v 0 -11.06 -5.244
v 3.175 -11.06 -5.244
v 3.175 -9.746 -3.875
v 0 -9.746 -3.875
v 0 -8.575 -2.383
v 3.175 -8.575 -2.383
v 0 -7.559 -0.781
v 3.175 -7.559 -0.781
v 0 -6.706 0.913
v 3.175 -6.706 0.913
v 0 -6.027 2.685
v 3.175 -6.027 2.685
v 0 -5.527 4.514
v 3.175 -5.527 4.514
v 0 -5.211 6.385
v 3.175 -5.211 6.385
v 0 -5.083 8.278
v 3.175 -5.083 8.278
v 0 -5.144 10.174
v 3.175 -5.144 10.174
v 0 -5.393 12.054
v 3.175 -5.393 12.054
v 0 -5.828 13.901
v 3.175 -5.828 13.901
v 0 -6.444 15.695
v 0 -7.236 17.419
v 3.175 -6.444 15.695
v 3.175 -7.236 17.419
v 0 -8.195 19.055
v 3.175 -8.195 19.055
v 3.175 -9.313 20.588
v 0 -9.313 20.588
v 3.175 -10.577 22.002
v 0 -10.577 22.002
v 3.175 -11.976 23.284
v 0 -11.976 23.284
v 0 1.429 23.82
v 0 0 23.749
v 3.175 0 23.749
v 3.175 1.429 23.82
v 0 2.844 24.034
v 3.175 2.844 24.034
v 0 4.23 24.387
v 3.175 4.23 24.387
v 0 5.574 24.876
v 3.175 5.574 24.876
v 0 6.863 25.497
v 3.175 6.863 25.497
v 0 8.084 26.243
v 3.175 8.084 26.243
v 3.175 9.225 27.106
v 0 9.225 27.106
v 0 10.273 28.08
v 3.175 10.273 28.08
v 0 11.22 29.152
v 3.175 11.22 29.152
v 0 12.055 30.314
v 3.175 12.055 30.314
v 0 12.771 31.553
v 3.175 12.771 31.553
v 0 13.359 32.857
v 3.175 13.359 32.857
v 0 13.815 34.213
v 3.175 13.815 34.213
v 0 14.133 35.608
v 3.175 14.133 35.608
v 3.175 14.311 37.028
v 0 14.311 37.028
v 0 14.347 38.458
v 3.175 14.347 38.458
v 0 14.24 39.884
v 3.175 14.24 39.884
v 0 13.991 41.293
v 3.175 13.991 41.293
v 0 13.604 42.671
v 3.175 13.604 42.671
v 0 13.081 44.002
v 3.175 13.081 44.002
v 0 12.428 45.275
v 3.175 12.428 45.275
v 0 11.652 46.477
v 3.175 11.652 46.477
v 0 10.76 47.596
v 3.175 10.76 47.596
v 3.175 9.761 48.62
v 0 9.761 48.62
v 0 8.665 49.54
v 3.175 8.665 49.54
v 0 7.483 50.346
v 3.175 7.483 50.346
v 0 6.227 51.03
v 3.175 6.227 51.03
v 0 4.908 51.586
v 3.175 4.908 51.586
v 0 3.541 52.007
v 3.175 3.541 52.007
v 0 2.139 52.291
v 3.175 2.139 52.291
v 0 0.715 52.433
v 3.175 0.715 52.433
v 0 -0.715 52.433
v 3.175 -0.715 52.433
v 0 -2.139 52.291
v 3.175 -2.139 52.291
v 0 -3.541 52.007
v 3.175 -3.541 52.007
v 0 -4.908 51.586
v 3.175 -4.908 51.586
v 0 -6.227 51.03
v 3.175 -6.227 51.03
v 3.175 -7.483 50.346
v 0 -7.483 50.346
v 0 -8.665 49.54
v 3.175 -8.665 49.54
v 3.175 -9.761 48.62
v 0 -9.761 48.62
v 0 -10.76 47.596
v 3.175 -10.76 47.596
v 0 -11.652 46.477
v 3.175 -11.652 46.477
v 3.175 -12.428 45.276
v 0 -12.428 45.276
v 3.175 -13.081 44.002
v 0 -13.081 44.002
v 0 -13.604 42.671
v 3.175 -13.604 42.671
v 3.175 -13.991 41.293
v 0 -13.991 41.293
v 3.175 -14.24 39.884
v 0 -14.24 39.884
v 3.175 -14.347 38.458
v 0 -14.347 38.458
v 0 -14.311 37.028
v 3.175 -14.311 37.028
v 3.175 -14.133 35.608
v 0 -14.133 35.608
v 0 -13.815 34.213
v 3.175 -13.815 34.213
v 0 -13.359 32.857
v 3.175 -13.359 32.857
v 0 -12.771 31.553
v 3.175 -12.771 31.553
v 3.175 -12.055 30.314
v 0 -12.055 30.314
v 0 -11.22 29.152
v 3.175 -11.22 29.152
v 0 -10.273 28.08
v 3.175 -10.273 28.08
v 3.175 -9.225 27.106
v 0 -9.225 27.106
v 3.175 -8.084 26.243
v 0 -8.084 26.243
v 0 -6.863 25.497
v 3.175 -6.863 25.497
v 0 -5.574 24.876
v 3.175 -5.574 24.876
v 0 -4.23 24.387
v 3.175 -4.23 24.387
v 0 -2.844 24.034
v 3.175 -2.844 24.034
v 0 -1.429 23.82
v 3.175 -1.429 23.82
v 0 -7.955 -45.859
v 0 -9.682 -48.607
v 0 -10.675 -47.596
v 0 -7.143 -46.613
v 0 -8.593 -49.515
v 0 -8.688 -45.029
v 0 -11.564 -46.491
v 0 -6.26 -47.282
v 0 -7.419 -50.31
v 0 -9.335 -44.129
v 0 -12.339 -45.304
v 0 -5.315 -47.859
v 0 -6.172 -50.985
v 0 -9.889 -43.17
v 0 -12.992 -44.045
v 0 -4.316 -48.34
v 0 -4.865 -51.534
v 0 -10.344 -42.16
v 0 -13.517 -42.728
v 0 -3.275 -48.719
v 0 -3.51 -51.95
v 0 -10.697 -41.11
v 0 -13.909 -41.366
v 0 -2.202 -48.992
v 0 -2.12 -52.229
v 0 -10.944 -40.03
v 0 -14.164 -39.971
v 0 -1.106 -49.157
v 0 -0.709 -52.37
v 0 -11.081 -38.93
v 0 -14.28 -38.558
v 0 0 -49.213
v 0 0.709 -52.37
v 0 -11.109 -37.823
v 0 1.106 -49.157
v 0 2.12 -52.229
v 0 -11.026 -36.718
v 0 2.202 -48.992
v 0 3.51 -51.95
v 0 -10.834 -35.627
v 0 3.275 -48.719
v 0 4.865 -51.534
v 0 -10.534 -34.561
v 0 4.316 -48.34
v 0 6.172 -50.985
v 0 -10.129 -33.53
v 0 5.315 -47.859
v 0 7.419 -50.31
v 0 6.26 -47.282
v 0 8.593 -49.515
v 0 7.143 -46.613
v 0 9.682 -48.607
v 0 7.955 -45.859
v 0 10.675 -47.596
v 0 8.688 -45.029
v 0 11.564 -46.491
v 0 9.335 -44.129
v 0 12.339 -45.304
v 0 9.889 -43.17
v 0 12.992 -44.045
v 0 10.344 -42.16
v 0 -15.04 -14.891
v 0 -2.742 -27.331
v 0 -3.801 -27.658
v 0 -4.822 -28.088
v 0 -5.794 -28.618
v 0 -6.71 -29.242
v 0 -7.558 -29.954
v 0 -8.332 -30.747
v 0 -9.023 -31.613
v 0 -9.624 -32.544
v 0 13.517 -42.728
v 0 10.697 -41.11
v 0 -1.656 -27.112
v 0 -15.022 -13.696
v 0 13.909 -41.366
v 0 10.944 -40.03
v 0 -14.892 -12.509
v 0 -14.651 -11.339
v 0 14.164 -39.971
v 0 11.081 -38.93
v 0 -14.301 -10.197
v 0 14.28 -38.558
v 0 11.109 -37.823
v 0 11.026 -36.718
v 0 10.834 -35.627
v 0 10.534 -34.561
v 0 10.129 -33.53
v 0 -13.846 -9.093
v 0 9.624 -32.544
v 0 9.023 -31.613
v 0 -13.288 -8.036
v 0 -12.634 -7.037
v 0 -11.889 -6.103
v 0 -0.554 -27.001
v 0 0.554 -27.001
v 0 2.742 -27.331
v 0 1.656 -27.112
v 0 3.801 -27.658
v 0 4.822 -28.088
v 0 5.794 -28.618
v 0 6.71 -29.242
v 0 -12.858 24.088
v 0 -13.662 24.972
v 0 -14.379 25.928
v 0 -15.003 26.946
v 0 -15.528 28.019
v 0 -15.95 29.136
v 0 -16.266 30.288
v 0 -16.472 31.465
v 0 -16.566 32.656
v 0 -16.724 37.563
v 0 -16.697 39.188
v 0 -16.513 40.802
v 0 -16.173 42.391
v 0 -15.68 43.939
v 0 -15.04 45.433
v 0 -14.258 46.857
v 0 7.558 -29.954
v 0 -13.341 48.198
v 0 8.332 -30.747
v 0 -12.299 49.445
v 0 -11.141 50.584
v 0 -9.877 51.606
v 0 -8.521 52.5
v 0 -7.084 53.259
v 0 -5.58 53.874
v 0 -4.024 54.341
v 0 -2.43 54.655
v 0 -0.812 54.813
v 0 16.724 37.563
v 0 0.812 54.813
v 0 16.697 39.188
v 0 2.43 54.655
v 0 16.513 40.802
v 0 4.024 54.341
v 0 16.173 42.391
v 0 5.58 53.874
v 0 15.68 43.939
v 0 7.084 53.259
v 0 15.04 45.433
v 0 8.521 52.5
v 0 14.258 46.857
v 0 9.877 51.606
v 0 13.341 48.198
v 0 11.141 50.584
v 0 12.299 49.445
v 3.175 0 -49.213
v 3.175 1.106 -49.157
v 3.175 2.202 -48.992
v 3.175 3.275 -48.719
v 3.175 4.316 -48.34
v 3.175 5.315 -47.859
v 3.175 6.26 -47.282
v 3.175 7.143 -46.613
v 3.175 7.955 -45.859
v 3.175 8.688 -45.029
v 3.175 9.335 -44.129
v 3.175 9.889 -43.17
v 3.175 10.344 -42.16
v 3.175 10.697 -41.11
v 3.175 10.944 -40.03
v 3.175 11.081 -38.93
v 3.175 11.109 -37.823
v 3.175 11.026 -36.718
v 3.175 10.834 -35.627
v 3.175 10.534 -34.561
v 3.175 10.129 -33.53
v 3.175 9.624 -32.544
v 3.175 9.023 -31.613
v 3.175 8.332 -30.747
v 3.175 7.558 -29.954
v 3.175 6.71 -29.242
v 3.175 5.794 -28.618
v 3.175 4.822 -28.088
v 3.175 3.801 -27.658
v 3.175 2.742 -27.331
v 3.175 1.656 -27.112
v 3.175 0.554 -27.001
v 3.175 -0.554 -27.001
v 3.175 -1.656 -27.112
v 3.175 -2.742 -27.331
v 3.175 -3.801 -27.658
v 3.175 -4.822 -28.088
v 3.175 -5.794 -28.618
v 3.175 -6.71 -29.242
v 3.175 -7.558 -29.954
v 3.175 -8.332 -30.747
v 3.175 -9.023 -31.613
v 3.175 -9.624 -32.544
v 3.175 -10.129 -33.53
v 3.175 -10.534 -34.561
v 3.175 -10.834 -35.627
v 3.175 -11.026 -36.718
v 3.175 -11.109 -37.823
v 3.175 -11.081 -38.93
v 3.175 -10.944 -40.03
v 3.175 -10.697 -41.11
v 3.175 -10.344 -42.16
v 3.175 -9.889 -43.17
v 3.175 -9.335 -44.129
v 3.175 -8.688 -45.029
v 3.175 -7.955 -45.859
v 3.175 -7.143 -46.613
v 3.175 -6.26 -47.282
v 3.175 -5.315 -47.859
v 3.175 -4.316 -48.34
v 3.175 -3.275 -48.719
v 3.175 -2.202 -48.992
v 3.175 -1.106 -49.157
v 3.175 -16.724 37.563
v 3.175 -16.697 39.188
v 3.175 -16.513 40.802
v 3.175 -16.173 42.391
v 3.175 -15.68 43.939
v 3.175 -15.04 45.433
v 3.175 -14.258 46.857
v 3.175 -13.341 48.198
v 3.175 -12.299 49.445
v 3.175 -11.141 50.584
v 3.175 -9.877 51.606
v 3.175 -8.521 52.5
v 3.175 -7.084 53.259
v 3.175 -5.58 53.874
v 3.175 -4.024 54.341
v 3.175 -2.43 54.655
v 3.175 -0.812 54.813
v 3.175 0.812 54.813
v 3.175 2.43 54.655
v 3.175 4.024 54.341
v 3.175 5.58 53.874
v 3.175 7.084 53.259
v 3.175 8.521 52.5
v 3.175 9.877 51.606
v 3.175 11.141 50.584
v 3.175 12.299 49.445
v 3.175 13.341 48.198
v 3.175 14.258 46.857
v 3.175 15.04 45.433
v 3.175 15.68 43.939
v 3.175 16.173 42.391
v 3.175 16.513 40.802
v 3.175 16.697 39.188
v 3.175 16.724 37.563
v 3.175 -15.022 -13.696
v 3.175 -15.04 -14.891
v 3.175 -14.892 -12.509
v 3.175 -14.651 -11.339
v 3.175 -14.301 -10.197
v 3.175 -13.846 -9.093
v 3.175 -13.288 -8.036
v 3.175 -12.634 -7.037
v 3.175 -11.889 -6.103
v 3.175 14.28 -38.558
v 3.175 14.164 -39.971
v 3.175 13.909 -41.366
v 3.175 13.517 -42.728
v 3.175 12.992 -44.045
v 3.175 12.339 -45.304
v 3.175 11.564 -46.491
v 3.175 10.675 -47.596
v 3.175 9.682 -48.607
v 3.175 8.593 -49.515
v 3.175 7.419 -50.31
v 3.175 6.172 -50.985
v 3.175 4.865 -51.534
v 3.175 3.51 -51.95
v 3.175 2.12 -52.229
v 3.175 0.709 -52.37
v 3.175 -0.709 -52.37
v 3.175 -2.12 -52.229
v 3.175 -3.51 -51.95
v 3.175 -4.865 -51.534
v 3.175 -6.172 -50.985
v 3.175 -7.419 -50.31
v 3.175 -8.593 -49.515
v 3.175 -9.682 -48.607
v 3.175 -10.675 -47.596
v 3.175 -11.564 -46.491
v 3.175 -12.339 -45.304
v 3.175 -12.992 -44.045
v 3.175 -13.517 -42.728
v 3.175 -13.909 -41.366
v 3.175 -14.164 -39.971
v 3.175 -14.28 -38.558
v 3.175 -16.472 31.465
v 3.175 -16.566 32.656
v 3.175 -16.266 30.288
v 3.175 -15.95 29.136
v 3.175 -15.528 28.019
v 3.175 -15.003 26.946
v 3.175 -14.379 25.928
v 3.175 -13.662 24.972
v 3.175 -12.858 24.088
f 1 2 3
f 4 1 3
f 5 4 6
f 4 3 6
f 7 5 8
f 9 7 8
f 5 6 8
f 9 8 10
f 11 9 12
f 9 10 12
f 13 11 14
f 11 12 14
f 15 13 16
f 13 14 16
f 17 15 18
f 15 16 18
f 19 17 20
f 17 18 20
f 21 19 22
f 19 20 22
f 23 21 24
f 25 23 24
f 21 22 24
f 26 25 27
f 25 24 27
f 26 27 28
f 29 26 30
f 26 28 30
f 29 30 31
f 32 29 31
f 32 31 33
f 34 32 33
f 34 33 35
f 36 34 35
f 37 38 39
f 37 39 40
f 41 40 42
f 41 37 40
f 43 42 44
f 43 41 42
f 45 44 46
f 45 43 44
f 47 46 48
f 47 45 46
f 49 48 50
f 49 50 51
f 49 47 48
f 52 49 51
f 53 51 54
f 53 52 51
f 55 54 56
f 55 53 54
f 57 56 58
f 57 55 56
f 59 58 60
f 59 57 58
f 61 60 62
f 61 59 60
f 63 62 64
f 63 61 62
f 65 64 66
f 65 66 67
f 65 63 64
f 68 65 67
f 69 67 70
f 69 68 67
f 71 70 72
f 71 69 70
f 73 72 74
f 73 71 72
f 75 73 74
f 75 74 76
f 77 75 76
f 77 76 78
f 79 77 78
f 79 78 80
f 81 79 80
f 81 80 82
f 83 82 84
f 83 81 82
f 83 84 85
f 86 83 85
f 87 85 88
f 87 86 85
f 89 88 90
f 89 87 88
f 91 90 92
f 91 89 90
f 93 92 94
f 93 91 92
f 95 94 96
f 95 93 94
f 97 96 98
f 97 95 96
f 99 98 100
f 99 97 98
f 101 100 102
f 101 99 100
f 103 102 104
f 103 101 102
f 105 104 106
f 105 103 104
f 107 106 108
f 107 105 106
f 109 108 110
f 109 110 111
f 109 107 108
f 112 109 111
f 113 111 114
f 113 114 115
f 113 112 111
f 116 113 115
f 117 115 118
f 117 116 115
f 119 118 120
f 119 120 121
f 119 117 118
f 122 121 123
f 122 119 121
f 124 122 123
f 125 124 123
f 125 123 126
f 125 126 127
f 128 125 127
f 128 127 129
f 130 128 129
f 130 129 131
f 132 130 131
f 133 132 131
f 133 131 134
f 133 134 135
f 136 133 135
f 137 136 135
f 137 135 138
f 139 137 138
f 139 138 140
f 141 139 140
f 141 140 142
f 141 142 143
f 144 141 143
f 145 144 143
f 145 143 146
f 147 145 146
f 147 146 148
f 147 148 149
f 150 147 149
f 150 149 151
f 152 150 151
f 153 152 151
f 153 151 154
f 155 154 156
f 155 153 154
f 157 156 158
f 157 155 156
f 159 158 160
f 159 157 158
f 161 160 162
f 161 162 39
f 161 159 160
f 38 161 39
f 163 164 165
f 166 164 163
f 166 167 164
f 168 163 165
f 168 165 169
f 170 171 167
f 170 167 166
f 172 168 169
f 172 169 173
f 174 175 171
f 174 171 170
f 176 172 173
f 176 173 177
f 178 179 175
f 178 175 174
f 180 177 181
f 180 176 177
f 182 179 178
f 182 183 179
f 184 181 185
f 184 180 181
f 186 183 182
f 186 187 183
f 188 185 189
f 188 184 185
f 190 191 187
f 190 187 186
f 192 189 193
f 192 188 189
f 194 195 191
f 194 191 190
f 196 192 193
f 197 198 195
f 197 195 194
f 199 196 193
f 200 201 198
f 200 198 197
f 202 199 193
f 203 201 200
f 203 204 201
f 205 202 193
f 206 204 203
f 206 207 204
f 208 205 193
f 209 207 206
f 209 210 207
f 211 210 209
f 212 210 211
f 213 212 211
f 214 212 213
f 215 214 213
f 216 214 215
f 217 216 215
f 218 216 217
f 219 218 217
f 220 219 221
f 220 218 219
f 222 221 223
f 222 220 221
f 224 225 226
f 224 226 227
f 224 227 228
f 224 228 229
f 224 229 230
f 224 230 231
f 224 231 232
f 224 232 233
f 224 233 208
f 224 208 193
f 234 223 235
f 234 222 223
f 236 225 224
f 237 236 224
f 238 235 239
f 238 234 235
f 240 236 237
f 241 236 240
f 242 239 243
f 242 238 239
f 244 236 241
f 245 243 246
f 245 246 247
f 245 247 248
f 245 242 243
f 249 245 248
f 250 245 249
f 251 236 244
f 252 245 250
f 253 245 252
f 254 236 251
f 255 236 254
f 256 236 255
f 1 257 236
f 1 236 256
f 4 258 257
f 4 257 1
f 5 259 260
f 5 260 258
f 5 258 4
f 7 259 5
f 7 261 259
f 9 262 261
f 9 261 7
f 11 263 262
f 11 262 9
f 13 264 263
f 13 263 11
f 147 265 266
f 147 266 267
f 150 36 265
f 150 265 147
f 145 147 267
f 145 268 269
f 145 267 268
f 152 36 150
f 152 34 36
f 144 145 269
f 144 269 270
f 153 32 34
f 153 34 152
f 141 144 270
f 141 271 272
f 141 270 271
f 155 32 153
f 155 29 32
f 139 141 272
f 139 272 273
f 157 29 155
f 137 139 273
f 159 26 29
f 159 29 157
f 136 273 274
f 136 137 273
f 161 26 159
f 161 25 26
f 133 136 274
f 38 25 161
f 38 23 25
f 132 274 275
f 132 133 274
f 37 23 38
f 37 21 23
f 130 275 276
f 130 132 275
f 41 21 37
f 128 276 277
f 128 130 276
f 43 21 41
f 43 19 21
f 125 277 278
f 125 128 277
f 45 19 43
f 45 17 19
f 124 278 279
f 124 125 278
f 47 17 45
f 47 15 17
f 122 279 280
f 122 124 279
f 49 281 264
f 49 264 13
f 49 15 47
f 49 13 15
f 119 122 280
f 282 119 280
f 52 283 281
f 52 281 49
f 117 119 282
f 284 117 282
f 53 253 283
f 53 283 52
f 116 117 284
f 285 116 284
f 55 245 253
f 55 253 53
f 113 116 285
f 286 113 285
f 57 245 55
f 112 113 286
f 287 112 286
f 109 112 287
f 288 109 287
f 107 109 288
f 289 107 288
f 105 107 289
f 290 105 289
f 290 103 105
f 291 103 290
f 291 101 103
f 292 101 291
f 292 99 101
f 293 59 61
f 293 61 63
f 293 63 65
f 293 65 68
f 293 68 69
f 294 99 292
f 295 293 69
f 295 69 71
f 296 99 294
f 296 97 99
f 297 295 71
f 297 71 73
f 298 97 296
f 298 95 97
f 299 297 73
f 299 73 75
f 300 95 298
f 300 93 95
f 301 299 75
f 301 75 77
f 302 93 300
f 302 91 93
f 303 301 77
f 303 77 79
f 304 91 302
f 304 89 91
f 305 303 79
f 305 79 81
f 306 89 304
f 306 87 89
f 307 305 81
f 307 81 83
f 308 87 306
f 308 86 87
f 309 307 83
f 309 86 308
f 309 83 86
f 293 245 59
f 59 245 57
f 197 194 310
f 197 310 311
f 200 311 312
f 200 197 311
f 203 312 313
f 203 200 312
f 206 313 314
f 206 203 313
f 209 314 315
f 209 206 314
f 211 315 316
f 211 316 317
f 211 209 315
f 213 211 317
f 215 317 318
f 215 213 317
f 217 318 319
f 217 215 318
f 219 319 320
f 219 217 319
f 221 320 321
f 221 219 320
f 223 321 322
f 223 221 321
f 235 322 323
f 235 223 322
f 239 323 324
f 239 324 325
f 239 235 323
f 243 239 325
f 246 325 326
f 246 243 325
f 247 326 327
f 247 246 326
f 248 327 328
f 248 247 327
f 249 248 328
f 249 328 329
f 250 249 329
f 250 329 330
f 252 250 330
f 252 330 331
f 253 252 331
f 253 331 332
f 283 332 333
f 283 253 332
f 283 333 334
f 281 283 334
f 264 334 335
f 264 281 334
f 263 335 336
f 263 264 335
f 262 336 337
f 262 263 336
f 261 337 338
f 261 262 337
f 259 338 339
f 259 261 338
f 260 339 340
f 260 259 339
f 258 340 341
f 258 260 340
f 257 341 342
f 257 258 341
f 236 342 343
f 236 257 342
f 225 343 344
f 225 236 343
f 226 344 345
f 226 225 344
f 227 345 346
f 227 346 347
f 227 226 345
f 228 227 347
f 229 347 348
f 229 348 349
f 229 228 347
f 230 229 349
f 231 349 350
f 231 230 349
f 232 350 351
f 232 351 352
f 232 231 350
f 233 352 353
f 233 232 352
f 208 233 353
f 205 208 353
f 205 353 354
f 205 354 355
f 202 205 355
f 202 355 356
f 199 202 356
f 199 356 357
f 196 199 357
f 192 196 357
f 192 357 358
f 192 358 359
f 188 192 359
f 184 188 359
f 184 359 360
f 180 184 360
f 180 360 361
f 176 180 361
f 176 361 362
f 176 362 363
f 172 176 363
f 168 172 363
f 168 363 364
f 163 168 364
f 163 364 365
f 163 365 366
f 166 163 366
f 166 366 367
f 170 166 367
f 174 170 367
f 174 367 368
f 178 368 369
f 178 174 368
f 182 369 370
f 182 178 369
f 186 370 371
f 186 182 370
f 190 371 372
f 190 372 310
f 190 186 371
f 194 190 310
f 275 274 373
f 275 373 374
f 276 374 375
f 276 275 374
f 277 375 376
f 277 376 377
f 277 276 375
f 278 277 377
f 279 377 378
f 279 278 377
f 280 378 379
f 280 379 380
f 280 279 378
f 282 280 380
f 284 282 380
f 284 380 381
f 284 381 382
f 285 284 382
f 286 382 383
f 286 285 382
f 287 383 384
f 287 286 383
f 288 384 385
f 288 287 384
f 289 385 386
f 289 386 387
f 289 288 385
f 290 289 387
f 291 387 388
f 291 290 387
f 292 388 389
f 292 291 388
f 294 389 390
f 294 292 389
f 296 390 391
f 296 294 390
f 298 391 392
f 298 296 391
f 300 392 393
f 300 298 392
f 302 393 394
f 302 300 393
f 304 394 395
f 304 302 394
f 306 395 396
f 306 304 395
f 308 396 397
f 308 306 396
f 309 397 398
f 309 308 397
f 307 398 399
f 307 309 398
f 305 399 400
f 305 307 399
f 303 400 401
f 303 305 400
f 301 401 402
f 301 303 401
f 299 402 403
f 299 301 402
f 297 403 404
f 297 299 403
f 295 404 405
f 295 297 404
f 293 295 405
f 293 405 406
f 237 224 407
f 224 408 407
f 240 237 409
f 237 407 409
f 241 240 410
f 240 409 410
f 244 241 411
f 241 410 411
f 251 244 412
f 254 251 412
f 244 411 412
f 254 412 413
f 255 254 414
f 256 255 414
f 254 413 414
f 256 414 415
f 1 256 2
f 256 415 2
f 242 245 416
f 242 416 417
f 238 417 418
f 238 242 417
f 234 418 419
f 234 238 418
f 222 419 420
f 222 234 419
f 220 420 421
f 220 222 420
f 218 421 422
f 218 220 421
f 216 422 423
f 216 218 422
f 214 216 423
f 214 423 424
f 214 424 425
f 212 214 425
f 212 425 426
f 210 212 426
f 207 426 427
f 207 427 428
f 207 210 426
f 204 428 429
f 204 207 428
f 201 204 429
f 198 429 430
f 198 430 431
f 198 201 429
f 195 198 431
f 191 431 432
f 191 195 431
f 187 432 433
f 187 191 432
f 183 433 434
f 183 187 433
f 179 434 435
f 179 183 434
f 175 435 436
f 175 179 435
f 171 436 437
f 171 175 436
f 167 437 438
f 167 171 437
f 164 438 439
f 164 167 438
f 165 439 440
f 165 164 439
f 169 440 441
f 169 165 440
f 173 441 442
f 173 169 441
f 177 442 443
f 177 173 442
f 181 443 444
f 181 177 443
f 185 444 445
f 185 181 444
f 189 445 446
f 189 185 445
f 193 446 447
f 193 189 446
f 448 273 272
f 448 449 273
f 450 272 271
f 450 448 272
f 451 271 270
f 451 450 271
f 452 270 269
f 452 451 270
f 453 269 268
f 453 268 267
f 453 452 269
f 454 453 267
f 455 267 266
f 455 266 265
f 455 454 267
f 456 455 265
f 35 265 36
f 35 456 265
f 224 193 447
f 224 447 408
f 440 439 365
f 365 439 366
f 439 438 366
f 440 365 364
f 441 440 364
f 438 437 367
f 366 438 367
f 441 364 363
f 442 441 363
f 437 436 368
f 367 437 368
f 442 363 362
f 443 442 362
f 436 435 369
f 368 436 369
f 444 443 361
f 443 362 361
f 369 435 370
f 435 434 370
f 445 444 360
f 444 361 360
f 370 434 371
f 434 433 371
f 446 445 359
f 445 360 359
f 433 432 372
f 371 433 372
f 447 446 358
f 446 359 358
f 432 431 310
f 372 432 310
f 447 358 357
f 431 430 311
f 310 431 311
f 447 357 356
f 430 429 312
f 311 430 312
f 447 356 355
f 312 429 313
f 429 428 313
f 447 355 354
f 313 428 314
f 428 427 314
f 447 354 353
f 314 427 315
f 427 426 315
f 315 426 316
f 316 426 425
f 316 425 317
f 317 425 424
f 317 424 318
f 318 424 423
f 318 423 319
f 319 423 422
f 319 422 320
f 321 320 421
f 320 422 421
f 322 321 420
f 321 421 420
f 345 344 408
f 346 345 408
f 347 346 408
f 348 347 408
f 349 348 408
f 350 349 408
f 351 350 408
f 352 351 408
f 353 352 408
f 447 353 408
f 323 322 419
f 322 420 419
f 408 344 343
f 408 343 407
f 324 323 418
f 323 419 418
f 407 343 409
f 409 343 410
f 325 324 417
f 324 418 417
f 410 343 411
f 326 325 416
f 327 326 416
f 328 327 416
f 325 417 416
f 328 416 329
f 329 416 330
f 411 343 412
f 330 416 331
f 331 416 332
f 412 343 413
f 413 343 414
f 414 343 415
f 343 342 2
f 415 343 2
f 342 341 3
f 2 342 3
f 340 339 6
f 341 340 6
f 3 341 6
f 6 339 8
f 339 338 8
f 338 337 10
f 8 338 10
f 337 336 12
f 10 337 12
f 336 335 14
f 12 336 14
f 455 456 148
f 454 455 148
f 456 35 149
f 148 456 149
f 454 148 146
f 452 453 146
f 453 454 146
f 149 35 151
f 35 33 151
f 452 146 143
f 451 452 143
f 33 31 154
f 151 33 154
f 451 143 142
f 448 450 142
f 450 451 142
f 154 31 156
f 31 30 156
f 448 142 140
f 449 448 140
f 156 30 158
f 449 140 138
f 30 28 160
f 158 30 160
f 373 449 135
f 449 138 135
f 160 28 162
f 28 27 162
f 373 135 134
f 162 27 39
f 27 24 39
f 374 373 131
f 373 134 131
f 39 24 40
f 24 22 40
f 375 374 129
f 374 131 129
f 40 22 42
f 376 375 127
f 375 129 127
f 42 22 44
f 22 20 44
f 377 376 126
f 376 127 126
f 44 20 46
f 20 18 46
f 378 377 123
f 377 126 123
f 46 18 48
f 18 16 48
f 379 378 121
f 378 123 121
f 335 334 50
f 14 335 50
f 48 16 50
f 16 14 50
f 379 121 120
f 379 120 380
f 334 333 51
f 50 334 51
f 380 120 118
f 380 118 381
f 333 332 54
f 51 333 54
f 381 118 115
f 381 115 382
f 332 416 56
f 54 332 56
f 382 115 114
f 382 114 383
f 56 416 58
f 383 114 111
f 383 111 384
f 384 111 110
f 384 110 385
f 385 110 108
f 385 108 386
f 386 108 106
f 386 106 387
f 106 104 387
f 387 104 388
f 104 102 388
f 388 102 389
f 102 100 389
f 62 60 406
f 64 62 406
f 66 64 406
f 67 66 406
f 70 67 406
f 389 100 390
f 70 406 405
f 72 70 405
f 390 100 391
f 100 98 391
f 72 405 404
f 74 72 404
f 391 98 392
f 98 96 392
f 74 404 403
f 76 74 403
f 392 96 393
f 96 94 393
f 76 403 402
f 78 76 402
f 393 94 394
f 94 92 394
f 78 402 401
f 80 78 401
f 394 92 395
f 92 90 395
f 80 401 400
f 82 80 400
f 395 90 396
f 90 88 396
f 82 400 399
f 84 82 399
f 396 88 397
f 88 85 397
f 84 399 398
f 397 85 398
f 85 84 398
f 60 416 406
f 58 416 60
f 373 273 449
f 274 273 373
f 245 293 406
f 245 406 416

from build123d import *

# Parameters (mm, degrees)
SKETCH1_R           = 14.351
SKETCH1_R_2         = 11.1125
BOSS_EXTRUDE1_DEPTH = 3.175
SKETCH2_R           = 19.05
CUT_EXTRUDE1_DEPTH  = 58.416238601
FILLET1_R           = 12.7


with BuildPart() as part:
    # Sketch1 → Boss-Extrude1 (new body)
    with BuildSketch(Plane(origin=(0, 0, 0), x_dir=(0, 0, -1), z_dir=(1, 0, 0))):
        with BuildLine():
            Line((-37.563173646, 16.723636193), (38.558390625, 14.280144757))
            ThreePointArc((38.558390625, 14.280144757), (52.3875, 0), (38.558390625, -14.280144757))
            Line((38.558390625, -14.280144757), (-37.563173646, -16.723636193))
            ThreePointArc((-37.563173646, -16.723636193), (-54.83225, 0), (-37.563173646, 16.723636193))
        make_face()
        with Locations((-38.1, 0)):
            Circle(SKETCH1_R, mode=Mode.SUBTRACT)
        with Locations((38.1, 0)):
            Circle(SKETCH1_R_2, mode=Mode.SUBTRACT)
    extrude(amount=BOSS_EXTRUDE1_DEPTH)

    # Sketch2 → Cut-Extrude1 (cut, through all)
    with BuildSketch(Plane(origin=(3.175, 0, 0), x_dir=(0, 0, -1), z_dir=(1, 0, 0))):
        with Locations((-8.615205614, -24.13)):
            Circle(SKETCH2_R)
    extrude(amount=-CUT_EXTRUDE1_DEPTH, mode=Mode.SUBTRACT)

    # Fillet1
    fillet1_edges = [part.edges().sort_by_distance(p)[0] for p in [
        (1.5875, -15.253351608, -8.240286468),
        (1.5875, -16.352629743, 26.005289337),
    ]]
    fillet(fillet1_edges, radius=FILLET1_R)


solid = part.part
